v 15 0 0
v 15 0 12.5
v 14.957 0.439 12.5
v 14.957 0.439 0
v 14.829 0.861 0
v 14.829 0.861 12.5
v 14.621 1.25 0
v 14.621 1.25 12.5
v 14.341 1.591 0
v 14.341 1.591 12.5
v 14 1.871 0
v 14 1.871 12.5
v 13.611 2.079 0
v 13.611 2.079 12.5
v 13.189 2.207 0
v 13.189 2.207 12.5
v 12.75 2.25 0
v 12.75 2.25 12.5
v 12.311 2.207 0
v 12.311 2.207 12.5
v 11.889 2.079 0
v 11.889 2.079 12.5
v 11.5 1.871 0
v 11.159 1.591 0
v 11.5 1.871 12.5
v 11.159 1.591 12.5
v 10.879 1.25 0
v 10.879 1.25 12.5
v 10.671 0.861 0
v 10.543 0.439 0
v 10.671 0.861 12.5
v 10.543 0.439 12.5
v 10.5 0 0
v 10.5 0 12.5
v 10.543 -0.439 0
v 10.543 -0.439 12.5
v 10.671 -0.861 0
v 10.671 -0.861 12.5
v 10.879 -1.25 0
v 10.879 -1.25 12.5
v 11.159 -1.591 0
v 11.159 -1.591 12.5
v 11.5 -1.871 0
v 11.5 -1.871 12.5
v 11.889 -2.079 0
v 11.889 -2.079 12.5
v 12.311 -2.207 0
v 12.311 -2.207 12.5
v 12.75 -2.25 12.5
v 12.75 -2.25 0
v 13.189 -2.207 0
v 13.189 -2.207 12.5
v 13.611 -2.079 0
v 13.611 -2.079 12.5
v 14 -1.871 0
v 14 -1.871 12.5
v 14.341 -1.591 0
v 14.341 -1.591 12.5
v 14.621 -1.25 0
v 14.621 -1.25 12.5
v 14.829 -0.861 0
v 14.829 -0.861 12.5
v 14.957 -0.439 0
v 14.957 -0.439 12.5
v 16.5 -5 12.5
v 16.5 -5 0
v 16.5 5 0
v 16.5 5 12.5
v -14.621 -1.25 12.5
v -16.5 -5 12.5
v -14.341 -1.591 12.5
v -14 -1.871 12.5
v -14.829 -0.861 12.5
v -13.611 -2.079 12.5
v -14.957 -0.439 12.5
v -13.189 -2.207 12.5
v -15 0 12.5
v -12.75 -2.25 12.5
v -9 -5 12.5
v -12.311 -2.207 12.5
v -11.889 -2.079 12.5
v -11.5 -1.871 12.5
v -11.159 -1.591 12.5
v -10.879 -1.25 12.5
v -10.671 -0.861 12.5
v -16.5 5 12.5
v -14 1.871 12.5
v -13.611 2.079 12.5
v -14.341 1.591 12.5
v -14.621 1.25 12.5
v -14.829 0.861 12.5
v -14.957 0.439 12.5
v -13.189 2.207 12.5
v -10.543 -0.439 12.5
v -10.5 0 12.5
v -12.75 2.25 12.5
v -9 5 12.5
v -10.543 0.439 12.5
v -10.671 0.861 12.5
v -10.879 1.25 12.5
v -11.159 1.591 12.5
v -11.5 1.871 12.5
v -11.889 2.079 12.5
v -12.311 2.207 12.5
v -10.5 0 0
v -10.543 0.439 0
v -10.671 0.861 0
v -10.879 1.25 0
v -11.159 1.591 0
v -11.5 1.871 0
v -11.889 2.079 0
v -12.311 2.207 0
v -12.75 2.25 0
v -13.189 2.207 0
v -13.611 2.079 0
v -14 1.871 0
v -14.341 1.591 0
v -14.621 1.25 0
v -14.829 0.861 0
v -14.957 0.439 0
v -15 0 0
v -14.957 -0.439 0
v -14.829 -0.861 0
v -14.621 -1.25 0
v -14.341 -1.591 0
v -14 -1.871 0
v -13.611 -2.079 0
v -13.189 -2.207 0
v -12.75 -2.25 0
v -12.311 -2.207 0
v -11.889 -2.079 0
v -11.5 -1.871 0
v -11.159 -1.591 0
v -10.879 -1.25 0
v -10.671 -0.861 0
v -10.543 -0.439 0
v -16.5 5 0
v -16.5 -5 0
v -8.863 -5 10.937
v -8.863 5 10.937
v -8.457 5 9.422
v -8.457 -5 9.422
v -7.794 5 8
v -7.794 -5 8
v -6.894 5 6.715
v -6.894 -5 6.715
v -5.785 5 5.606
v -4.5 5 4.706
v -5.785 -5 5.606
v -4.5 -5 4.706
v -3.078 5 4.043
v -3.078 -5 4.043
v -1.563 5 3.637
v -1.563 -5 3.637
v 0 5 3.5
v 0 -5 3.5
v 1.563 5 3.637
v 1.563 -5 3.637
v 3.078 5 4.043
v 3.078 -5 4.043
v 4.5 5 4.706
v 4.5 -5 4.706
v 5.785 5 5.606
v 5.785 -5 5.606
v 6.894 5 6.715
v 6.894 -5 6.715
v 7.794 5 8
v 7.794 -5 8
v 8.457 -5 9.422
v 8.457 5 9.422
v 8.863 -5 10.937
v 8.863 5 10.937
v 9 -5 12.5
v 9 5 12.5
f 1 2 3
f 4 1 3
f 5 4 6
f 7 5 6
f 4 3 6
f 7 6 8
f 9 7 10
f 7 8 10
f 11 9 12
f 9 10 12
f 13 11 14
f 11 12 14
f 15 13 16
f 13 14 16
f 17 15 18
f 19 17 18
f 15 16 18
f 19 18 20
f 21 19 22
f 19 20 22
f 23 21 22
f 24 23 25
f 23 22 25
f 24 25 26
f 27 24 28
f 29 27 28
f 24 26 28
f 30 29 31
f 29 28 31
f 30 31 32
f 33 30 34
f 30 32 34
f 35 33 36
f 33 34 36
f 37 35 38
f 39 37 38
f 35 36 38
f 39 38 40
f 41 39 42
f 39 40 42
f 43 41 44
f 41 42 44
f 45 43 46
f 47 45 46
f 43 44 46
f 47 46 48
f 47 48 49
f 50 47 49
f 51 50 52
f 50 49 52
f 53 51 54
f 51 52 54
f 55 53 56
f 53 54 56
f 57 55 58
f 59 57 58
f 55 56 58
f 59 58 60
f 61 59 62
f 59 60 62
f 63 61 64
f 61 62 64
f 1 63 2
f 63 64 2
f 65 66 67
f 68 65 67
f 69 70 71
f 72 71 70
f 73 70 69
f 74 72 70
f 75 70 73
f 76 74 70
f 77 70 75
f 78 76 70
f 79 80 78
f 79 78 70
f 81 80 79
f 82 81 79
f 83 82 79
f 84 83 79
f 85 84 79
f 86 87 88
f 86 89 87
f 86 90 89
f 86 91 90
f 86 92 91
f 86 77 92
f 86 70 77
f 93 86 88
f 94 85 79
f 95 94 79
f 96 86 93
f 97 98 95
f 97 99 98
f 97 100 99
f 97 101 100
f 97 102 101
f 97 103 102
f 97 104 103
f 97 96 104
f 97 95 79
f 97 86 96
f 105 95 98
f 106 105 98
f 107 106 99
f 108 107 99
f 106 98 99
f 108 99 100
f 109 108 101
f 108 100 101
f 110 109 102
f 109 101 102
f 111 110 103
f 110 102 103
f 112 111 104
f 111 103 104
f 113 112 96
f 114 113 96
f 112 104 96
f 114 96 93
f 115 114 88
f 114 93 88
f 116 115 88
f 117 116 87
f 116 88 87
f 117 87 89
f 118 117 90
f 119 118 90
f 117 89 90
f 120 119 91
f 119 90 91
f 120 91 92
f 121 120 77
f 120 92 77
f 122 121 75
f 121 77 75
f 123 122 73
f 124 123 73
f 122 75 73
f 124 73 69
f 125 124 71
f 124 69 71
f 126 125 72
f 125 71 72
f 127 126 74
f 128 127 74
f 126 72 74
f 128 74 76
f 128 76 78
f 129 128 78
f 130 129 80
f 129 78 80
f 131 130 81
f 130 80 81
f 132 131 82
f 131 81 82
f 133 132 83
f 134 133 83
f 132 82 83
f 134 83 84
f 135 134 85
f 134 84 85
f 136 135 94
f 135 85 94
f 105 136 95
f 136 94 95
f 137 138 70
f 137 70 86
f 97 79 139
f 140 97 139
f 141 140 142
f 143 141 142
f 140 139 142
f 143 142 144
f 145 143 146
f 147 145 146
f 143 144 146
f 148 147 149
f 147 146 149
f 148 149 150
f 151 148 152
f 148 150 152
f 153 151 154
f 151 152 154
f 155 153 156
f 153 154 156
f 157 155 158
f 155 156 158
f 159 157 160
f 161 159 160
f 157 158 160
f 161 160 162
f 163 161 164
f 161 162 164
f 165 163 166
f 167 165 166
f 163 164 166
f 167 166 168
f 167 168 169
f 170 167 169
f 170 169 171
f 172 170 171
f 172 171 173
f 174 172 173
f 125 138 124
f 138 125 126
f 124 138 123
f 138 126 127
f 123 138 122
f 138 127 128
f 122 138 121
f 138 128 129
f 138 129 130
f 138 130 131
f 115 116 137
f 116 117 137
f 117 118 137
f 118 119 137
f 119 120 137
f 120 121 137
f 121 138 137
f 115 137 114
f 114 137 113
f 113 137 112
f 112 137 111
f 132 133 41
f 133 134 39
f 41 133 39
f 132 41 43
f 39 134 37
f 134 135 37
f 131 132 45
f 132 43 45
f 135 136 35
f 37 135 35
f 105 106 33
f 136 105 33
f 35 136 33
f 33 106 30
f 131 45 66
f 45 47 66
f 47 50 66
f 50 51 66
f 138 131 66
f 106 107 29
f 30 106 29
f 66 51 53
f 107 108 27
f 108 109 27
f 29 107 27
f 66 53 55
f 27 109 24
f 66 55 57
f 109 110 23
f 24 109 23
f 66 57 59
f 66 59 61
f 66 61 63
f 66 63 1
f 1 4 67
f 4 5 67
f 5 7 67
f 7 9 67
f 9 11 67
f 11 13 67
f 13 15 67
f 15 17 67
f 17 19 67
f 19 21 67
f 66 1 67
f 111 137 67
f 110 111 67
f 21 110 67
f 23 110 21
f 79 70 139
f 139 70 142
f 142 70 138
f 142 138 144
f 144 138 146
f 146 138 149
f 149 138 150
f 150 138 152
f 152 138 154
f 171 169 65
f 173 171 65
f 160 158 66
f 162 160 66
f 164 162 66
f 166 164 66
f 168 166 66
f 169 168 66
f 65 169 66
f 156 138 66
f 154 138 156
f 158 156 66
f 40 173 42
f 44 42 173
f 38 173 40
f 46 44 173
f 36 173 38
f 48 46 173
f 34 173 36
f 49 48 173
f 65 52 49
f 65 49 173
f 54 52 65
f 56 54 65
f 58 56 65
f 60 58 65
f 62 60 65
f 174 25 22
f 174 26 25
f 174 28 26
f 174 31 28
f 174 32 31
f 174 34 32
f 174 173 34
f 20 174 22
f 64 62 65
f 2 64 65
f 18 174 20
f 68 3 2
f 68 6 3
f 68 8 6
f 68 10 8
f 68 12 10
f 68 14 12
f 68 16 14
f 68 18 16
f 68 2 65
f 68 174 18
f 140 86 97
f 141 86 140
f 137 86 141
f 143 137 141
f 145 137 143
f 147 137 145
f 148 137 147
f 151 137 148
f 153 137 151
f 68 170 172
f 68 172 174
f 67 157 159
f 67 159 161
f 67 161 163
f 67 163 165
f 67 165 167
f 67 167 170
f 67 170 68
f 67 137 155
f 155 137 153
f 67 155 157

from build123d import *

# Parameters (mm, degrees)
F0_W     = 33
F0_H     = 10
F1_DEPTH = 12.5
F2_R     = 9
F3_DEPTH = 10
F4_R     = 2.25
F5_DEPTH = 12.5


with BuildPart() as f1:
    # F0 (on Top) → F1 (new body)
    with BuildSketch(Plane.XY):
        Rectangle(F0_W, F0_H)
    extrude(amount=F1_DEPTH)

    # F2 (on face) → F3 (cut)
    with BuildSketch(Plane.XZ.offset(5)):
        with Locations((0, 12.5)):
            Circle(F2_R)
    extrude(amount=-F3_DEPTH, mode=Mode.SUBTRACT)

    # F4 (on face) → F5 (cut)
    with BuildSketch(Plane.XY.offset(12.5)):
        with Locations((-12.75, 0)):
            Circle(F4_R)
        with Locations((12.75, 0)):
            Circle(F4_R)
    extrude(amount=-F5_DEPTH, mode=Mode.SUBTRACT)


solid = f1.part
